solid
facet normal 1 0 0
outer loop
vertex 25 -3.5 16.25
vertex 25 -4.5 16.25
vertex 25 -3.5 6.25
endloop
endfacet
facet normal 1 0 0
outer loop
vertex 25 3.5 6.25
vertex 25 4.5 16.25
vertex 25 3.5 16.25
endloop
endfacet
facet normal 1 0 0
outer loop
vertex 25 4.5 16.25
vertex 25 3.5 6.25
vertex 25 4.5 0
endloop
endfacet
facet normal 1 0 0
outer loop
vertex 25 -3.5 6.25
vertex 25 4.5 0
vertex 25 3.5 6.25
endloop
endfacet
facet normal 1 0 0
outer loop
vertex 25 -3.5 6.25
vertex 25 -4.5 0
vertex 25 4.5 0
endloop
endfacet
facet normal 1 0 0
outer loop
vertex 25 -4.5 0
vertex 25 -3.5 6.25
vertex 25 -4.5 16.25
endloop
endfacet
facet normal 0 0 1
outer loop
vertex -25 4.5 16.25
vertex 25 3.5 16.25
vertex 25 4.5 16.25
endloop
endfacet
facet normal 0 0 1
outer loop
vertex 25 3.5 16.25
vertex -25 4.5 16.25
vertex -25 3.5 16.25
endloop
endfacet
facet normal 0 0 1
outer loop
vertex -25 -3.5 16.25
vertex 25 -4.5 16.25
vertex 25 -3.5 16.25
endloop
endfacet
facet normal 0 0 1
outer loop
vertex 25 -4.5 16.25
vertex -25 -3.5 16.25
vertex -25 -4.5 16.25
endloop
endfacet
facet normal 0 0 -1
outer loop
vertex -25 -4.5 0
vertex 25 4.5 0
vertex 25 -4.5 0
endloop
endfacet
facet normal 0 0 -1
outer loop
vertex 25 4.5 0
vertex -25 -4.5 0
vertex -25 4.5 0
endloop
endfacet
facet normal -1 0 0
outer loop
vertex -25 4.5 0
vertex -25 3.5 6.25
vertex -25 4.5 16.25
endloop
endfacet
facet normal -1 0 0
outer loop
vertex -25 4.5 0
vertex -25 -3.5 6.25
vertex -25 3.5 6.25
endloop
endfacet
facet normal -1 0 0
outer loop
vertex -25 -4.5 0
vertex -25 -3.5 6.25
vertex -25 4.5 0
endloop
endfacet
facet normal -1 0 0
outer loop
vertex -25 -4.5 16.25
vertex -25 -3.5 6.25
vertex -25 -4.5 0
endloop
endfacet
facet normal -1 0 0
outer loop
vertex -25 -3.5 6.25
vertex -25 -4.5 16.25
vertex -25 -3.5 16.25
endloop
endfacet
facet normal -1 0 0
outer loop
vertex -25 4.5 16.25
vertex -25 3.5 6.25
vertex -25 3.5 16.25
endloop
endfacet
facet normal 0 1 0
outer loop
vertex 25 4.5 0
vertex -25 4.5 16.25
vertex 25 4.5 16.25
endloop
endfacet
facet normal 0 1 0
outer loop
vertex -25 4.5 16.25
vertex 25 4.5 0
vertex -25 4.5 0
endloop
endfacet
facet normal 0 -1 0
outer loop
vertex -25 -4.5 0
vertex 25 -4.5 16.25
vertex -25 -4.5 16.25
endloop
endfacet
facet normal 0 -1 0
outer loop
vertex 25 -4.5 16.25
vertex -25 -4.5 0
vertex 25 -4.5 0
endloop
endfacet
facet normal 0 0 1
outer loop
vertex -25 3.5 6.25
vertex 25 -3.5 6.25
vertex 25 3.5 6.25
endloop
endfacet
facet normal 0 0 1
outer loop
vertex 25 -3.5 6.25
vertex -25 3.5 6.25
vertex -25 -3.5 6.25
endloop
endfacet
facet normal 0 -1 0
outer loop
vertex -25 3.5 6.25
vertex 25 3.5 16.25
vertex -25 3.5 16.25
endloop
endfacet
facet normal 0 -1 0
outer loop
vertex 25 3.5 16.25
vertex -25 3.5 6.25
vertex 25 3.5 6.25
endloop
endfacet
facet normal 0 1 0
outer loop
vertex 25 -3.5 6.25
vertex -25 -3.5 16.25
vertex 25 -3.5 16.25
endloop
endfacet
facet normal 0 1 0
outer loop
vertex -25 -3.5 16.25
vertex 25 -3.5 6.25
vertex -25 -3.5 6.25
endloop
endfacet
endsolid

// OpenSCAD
// Customizable Replicator Bed Adjustment Clip

// How long a clip do you need, in mm? (50 fits Replicator)
len = 50;
// How much do you want the clip to lower the Replicator print bed?
height=6.25;
// How thick should the clip "wings" be?
t=1;
// How much should the "wings" stick up?
tail=10;
// How thick is the board it clips around, plus a little clearance?
around=7;	

width=around+2*t;

translate([-len/2,-width/2,0]) 
difference() {
	cube([len,width,height+tail]);
	translate([0,t,height]) cube([len,around,tail]);
	}
